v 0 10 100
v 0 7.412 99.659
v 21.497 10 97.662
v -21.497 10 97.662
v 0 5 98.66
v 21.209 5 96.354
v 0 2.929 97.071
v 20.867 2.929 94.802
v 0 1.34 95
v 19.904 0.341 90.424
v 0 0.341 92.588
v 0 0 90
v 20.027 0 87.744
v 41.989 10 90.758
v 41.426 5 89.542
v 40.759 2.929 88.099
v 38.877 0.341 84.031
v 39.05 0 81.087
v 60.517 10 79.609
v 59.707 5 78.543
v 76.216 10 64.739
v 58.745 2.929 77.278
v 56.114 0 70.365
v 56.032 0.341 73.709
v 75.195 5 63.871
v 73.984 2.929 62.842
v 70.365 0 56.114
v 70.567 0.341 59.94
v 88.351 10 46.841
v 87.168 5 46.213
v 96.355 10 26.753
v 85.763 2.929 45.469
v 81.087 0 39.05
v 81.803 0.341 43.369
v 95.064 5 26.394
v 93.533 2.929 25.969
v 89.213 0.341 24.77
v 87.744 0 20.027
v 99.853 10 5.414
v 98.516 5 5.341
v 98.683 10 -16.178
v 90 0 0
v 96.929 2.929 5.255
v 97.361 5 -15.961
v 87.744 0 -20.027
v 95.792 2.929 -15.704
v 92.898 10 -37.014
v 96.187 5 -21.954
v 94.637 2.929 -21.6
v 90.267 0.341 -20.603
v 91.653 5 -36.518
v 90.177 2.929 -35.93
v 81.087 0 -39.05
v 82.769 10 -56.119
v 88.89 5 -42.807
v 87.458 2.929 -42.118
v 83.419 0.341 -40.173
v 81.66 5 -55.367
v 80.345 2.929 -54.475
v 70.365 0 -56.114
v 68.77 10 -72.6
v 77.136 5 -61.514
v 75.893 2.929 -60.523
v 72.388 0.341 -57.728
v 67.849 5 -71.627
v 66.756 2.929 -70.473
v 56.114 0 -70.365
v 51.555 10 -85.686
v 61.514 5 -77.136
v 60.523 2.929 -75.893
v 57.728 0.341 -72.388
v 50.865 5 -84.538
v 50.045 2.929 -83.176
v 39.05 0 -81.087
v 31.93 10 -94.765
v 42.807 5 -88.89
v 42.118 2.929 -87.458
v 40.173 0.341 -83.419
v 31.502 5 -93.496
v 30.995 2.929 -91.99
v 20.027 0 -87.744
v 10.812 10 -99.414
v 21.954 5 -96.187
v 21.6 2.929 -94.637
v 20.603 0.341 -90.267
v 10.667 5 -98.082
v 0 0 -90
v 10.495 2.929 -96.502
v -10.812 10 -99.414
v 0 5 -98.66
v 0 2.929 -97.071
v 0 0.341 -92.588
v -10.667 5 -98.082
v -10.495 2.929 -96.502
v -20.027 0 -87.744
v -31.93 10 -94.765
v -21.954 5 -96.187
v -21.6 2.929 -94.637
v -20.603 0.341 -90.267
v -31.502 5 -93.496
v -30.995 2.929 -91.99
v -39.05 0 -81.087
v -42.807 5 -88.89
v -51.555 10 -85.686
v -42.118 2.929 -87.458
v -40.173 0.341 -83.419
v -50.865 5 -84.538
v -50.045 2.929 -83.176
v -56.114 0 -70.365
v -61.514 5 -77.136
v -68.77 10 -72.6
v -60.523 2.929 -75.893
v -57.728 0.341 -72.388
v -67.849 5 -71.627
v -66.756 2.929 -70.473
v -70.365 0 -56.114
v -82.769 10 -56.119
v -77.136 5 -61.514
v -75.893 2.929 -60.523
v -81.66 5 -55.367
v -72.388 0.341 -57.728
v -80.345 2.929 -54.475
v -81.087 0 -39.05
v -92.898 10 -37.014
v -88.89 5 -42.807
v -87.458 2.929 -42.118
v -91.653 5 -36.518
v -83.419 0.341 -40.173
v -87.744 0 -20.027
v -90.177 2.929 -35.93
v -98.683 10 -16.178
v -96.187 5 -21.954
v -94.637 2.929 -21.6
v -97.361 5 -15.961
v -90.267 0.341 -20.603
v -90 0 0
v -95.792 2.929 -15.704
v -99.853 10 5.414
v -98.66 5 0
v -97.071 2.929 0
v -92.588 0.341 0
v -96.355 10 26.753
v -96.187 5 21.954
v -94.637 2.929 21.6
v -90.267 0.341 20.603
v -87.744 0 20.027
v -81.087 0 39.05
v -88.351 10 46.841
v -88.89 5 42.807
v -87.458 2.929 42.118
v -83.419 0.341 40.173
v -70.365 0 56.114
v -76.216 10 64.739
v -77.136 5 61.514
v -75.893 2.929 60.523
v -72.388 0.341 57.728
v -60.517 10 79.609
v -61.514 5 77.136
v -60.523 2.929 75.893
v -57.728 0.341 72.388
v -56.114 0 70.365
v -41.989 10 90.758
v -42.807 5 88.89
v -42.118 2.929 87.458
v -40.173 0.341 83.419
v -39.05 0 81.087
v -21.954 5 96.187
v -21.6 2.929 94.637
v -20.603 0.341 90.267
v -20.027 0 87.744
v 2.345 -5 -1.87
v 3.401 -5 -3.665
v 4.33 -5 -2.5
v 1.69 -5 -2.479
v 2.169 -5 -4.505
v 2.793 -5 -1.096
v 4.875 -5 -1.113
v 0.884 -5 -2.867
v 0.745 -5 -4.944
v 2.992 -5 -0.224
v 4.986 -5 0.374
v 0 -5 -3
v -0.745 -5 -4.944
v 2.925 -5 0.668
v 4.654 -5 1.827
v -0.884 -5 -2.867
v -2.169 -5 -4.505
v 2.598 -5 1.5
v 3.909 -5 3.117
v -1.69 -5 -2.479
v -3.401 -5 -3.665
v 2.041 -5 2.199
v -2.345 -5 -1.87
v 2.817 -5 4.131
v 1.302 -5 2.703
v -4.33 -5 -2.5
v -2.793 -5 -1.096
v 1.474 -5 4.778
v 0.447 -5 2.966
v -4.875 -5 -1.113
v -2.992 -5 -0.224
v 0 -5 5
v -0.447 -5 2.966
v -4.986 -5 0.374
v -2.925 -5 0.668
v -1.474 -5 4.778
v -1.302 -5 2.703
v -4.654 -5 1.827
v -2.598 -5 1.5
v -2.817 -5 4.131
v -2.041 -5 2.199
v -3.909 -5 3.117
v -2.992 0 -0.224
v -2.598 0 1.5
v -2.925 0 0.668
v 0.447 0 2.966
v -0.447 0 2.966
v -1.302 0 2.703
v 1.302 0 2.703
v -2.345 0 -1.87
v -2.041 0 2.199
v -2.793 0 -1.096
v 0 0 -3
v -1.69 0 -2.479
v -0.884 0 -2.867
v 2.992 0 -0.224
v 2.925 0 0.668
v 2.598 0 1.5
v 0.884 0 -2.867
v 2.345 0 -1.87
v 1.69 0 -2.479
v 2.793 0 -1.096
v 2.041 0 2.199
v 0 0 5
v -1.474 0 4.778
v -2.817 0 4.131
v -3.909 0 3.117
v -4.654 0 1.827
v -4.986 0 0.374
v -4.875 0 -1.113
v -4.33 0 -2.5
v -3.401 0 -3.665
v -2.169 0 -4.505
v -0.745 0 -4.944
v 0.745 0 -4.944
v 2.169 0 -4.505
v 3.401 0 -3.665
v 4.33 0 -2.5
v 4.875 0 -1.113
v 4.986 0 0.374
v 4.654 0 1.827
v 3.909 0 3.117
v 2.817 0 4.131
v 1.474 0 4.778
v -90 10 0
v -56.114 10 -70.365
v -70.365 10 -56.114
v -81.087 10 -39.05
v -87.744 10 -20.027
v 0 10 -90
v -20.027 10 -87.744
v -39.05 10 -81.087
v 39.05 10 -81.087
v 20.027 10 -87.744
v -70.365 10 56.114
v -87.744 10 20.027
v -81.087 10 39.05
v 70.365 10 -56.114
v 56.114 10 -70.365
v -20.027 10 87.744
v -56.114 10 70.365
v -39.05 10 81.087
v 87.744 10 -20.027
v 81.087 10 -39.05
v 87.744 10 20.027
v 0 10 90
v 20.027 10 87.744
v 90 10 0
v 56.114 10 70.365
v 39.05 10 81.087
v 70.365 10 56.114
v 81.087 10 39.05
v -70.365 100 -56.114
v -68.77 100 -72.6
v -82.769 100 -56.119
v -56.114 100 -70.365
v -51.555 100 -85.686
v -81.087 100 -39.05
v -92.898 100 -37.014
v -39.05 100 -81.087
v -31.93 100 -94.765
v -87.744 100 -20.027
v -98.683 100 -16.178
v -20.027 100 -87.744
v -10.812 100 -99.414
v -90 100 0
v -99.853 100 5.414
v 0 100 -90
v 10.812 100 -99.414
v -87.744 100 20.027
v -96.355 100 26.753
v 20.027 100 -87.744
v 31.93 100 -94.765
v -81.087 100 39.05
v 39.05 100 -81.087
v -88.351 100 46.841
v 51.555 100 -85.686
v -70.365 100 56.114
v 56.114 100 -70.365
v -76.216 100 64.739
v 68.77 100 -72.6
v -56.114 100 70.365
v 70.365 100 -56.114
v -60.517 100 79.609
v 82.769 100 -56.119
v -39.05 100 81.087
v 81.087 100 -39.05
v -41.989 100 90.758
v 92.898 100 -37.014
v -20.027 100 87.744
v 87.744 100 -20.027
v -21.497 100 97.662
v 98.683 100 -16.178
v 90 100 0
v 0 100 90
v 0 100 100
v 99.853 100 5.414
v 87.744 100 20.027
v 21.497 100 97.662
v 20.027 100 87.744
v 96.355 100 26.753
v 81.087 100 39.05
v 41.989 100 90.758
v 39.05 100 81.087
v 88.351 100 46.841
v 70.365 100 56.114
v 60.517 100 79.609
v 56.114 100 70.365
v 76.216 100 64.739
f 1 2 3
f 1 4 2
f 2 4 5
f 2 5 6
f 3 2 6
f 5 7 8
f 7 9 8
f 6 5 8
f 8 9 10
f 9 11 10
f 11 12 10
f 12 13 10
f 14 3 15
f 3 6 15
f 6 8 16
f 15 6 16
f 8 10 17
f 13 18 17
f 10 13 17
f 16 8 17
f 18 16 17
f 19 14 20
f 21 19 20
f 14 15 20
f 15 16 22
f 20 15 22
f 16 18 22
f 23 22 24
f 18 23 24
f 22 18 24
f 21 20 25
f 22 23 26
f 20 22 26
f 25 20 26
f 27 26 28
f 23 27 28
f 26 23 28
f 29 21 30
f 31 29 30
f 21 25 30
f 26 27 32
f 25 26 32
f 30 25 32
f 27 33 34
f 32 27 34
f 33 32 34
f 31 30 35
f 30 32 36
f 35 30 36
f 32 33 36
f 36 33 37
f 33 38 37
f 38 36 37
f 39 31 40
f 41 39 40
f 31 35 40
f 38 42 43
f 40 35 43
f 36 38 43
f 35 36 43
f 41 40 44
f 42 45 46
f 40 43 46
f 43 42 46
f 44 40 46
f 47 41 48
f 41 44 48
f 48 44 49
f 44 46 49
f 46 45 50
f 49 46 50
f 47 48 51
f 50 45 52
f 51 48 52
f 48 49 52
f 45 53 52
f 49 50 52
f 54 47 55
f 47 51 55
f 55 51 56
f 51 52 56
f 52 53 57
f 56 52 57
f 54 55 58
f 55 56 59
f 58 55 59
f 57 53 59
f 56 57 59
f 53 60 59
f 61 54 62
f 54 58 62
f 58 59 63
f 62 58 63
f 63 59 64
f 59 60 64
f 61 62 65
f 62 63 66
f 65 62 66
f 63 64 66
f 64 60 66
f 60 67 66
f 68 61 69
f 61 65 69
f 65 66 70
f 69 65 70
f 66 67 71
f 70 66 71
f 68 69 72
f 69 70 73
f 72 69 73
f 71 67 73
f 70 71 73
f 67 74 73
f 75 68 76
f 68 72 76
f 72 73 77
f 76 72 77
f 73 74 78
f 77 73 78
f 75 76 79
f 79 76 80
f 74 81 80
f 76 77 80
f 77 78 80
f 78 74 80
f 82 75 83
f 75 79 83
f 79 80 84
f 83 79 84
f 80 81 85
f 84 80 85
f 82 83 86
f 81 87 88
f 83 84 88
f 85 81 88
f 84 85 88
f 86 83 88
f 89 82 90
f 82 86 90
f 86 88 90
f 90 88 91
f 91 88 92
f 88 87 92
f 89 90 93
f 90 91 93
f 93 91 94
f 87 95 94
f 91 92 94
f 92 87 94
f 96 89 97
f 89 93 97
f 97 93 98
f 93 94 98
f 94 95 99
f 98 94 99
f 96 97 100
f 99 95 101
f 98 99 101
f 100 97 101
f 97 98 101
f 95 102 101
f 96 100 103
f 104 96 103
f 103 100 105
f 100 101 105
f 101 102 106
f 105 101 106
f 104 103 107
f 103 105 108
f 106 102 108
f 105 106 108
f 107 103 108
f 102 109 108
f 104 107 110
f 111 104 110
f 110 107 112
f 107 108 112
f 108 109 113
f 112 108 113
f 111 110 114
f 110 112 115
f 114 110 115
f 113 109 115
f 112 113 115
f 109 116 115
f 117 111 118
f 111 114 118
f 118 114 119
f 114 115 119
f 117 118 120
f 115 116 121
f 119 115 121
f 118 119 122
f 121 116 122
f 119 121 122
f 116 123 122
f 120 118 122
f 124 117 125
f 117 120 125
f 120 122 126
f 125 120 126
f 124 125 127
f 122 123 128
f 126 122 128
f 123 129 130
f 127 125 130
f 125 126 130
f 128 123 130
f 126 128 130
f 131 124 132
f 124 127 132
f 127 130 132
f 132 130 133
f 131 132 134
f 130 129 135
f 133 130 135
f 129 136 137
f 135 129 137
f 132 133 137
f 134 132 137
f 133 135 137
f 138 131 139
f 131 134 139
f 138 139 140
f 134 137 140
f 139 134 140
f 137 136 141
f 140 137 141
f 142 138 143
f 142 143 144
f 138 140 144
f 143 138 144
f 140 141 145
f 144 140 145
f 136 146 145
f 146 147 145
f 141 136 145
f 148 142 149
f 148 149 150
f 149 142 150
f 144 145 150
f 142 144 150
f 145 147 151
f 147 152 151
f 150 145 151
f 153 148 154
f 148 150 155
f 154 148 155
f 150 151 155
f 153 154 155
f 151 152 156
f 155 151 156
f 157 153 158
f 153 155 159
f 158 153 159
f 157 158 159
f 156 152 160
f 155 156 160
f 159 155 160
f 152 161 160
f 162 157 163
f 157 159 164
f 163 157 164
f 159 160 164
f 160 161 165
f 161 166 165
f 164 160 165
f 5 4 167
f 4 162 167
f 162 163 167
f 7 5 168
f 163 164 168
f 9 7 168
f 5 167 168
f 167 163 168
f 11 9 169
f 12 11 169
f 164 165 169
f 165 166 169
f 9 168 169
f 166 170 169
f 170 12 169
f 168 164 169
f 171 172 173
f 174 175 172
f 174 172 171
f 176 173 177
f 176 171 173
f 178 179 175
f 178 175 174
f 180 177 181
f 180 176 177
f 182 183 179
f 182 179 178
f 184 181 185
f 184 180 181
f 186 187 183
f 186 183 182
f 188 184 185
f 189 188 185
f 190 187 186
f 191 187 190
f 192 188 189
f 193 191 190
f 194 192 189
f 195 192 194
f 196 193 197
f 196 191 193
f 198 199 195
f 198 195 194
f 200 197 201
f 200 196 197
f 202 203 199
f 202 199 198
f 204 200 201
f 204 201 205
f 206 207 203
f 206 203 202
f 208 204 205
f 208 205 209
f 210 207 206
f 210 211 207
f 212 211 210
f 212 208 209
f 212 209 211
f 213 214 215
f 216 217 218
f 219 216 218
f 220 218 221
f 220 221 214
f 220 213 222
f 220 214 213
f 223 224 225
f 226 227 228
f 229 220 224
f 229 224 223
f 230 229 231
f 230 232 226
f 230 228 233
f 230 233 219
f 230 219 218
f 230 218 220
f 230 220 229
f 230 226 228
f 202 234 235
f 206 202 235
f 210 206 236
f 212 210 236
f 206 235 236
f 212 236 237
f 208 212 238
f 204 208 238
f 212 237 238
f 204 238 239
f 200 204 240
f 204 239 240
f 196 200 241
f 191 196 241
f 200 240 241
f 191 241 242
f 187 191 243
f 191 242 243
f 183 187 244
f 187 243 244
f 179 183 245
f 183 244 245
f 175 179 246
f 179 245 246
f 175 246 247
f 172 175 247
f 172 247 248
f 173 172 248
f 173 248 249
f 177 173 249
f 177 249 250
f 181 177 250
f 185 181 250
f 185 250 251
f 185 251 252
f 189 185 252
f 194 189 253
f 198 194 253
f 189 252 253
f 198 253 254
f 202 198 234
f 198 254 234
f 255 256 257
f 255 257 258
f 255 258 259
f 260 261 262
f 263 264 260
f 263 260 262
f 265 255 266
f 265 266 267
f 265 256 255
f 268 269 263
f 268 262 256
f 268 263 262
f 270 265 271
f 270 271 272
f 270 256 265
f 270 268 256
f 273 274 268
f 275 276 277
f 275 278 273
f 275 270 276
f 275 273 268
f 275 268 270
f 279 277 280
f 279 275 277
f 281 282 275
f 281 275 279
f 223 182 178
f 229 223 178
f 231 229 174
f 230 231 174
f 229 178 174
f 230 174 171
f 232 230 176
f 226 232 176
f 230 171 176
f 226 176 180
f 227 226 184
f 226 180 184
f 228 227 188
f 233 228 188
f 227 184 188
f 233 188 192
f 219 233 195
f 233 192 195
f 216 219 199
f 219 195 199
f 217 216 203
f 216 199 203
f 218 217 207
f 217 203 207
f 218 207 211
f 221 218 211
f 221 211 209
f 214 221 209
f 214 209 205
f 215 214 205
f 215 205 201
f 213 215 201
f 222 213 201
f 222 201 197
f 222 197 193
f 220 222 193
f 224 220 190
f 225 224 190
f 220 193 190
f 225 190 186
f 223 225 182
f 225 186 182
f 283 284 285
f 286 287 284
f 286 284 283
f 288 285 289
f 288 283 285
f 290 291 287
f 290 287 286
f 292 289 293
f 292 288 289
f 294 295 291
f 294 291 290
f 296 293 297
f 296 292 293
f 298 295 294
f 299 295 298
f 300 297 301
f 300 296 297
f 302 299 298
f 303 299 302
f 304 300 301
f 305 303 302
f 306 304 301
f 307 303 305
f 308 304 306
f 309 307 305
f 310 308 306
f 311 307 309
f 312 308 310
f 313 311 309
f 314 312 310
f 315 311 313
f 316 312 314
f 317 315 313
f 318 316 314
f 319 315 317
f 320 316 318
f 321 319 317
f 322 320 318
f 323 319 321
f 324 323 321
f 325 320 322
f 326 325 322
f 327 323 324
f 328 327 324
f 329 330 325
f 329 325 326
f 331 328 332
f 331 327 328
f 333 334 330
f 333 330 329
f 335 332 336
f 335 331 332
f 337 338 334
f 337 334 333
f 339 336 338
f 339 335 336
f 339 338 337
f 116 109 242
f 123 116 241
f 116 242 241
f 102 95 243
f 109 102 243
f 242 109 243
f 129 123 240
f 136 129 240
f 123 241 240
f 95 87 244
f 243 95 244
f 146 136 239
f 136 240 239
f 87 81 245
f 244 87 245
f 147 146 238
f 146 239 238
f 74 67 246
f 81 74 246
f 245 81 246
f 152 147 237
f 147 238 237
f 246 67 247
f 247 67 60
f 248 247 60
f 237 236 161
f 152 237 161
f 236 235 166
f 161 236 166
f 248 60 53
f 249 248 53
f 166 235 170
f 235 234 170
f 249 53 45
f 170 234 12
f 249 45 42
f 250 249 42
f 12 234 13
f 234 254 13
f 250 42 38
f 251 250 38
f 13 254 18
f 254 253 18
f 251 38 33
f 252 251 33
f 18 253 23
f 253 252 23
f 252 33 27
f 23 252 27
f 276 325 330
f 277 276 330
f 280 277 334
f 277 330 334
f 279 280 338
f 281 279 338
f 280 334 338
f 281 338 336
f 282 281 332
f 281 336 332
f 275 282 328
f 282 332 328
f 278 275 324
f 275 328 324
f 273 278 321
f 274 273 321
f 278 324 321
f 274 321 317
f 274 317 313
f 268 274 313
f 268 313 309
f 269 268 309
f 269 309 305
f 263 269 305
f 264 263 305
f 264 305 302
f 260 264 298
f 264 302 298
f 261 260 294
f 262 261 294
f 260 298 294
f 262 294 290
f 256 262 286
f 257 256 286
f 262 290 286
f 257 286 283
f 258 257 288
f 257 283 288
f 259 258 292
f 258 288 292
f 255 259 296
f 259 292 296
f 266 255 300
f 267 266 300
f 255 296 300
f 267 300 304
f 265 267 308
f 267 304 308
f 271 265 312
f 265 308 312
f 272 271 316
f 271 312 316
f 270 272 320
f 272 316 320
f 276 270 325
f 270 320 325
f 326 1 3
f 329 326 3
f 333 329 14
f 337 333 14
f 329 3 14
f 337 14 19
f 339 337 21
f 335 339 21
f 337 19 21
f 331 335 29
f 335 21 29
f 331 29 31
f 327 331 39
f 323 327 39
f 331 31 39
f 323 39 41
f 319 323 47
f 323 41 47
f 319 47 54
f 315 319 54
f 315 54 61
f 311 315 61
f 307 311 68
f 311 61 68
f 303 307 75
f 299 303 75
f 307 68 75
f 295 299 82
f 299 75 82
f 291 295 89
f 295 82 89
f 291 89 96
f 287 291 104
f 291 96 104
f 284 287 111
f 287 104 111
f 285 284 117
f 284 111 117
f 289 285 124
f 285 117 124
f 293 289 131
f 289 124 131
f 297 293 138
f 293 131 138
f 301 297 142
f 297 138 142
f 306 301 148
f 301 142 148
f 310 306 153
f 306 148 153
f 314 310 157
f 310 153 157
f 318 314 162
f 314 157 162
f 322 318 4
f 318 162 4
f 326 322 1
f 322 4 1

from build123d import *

# Parameters (mm, degrees)
SKETCH1_R           = 100
BOSS_EXTRUDE1_DEPTH = 100
SKETCH2_R           = 90
CUT_EXTRUDE1_DEPTH  = 90
FILLET1_R           = 10
SKETCH3_R           = 5
BOSS_EXTRUDE2_DEPTH = 5
SKETCH4_R           = 3
CUT_EXTRUDE2_DEPTH  = 5


with BuildPart() as part:
    # Sketch1 → Boss-Extrude1 (new body)
    with BuildSketch(Plane(origin=(0, 0, 0), x_dir=(1, 0, 0), z_dir=(0, 1, 0))):
        with Locations(Location((0, 0, 0), (0, 0, 270))):
            Circle(SKETCH1_R)
    extrude(amount=BOSS_EXTRUDE1_DEPTH)

    # Sketch2 → Cut-Extrude1 (cut)
    with BuildSketch(Plane(origin=(0, 100, 0), x_dir=(1, 0, 0), z_dir=(0, 1, 0))):
        with Locations(Location((0, 0, 0), (0, 0, 270))):
            Circle(SKETCH2_R)
    extrude(amount=-CUT_EXTRUDE1_DEPTH, mode=Mode.SUBTRACT)

    # Fillet1
    fillet1_edges = [part.edges().sort_by_distance(p)[0] for p in [
        (0, 0, -100),
    ]]
    fillet(fillet1_edges, radius=FILLET1_R)

    # Sketch3 → Boss-Extrude2 (add)
    with BuildSketch(Plane.XZ):
        with Locations(Location((0, 0, 0), (0, 0, 90))):
            Circle(SKETCH3_R)
    extrude(amount=BOSS_EXTRUDE2_DEPTH)

    # Sketch4 → Cut-Extrude2 (cut)
    with BuildSketch(Plane(origin=(0, -5, 0), x_dir=(-1, 0, 0), z_dir=(0, -1, 0))):
        with Locations(Location((0, 0, 0), (0, 0, 90))):
            Circle(SKETCH4_R)
    extrude(amount=-CUT_EXTRUDE2_DEPTH, mode=Mode.SUBTRACT)


solid = part.part
